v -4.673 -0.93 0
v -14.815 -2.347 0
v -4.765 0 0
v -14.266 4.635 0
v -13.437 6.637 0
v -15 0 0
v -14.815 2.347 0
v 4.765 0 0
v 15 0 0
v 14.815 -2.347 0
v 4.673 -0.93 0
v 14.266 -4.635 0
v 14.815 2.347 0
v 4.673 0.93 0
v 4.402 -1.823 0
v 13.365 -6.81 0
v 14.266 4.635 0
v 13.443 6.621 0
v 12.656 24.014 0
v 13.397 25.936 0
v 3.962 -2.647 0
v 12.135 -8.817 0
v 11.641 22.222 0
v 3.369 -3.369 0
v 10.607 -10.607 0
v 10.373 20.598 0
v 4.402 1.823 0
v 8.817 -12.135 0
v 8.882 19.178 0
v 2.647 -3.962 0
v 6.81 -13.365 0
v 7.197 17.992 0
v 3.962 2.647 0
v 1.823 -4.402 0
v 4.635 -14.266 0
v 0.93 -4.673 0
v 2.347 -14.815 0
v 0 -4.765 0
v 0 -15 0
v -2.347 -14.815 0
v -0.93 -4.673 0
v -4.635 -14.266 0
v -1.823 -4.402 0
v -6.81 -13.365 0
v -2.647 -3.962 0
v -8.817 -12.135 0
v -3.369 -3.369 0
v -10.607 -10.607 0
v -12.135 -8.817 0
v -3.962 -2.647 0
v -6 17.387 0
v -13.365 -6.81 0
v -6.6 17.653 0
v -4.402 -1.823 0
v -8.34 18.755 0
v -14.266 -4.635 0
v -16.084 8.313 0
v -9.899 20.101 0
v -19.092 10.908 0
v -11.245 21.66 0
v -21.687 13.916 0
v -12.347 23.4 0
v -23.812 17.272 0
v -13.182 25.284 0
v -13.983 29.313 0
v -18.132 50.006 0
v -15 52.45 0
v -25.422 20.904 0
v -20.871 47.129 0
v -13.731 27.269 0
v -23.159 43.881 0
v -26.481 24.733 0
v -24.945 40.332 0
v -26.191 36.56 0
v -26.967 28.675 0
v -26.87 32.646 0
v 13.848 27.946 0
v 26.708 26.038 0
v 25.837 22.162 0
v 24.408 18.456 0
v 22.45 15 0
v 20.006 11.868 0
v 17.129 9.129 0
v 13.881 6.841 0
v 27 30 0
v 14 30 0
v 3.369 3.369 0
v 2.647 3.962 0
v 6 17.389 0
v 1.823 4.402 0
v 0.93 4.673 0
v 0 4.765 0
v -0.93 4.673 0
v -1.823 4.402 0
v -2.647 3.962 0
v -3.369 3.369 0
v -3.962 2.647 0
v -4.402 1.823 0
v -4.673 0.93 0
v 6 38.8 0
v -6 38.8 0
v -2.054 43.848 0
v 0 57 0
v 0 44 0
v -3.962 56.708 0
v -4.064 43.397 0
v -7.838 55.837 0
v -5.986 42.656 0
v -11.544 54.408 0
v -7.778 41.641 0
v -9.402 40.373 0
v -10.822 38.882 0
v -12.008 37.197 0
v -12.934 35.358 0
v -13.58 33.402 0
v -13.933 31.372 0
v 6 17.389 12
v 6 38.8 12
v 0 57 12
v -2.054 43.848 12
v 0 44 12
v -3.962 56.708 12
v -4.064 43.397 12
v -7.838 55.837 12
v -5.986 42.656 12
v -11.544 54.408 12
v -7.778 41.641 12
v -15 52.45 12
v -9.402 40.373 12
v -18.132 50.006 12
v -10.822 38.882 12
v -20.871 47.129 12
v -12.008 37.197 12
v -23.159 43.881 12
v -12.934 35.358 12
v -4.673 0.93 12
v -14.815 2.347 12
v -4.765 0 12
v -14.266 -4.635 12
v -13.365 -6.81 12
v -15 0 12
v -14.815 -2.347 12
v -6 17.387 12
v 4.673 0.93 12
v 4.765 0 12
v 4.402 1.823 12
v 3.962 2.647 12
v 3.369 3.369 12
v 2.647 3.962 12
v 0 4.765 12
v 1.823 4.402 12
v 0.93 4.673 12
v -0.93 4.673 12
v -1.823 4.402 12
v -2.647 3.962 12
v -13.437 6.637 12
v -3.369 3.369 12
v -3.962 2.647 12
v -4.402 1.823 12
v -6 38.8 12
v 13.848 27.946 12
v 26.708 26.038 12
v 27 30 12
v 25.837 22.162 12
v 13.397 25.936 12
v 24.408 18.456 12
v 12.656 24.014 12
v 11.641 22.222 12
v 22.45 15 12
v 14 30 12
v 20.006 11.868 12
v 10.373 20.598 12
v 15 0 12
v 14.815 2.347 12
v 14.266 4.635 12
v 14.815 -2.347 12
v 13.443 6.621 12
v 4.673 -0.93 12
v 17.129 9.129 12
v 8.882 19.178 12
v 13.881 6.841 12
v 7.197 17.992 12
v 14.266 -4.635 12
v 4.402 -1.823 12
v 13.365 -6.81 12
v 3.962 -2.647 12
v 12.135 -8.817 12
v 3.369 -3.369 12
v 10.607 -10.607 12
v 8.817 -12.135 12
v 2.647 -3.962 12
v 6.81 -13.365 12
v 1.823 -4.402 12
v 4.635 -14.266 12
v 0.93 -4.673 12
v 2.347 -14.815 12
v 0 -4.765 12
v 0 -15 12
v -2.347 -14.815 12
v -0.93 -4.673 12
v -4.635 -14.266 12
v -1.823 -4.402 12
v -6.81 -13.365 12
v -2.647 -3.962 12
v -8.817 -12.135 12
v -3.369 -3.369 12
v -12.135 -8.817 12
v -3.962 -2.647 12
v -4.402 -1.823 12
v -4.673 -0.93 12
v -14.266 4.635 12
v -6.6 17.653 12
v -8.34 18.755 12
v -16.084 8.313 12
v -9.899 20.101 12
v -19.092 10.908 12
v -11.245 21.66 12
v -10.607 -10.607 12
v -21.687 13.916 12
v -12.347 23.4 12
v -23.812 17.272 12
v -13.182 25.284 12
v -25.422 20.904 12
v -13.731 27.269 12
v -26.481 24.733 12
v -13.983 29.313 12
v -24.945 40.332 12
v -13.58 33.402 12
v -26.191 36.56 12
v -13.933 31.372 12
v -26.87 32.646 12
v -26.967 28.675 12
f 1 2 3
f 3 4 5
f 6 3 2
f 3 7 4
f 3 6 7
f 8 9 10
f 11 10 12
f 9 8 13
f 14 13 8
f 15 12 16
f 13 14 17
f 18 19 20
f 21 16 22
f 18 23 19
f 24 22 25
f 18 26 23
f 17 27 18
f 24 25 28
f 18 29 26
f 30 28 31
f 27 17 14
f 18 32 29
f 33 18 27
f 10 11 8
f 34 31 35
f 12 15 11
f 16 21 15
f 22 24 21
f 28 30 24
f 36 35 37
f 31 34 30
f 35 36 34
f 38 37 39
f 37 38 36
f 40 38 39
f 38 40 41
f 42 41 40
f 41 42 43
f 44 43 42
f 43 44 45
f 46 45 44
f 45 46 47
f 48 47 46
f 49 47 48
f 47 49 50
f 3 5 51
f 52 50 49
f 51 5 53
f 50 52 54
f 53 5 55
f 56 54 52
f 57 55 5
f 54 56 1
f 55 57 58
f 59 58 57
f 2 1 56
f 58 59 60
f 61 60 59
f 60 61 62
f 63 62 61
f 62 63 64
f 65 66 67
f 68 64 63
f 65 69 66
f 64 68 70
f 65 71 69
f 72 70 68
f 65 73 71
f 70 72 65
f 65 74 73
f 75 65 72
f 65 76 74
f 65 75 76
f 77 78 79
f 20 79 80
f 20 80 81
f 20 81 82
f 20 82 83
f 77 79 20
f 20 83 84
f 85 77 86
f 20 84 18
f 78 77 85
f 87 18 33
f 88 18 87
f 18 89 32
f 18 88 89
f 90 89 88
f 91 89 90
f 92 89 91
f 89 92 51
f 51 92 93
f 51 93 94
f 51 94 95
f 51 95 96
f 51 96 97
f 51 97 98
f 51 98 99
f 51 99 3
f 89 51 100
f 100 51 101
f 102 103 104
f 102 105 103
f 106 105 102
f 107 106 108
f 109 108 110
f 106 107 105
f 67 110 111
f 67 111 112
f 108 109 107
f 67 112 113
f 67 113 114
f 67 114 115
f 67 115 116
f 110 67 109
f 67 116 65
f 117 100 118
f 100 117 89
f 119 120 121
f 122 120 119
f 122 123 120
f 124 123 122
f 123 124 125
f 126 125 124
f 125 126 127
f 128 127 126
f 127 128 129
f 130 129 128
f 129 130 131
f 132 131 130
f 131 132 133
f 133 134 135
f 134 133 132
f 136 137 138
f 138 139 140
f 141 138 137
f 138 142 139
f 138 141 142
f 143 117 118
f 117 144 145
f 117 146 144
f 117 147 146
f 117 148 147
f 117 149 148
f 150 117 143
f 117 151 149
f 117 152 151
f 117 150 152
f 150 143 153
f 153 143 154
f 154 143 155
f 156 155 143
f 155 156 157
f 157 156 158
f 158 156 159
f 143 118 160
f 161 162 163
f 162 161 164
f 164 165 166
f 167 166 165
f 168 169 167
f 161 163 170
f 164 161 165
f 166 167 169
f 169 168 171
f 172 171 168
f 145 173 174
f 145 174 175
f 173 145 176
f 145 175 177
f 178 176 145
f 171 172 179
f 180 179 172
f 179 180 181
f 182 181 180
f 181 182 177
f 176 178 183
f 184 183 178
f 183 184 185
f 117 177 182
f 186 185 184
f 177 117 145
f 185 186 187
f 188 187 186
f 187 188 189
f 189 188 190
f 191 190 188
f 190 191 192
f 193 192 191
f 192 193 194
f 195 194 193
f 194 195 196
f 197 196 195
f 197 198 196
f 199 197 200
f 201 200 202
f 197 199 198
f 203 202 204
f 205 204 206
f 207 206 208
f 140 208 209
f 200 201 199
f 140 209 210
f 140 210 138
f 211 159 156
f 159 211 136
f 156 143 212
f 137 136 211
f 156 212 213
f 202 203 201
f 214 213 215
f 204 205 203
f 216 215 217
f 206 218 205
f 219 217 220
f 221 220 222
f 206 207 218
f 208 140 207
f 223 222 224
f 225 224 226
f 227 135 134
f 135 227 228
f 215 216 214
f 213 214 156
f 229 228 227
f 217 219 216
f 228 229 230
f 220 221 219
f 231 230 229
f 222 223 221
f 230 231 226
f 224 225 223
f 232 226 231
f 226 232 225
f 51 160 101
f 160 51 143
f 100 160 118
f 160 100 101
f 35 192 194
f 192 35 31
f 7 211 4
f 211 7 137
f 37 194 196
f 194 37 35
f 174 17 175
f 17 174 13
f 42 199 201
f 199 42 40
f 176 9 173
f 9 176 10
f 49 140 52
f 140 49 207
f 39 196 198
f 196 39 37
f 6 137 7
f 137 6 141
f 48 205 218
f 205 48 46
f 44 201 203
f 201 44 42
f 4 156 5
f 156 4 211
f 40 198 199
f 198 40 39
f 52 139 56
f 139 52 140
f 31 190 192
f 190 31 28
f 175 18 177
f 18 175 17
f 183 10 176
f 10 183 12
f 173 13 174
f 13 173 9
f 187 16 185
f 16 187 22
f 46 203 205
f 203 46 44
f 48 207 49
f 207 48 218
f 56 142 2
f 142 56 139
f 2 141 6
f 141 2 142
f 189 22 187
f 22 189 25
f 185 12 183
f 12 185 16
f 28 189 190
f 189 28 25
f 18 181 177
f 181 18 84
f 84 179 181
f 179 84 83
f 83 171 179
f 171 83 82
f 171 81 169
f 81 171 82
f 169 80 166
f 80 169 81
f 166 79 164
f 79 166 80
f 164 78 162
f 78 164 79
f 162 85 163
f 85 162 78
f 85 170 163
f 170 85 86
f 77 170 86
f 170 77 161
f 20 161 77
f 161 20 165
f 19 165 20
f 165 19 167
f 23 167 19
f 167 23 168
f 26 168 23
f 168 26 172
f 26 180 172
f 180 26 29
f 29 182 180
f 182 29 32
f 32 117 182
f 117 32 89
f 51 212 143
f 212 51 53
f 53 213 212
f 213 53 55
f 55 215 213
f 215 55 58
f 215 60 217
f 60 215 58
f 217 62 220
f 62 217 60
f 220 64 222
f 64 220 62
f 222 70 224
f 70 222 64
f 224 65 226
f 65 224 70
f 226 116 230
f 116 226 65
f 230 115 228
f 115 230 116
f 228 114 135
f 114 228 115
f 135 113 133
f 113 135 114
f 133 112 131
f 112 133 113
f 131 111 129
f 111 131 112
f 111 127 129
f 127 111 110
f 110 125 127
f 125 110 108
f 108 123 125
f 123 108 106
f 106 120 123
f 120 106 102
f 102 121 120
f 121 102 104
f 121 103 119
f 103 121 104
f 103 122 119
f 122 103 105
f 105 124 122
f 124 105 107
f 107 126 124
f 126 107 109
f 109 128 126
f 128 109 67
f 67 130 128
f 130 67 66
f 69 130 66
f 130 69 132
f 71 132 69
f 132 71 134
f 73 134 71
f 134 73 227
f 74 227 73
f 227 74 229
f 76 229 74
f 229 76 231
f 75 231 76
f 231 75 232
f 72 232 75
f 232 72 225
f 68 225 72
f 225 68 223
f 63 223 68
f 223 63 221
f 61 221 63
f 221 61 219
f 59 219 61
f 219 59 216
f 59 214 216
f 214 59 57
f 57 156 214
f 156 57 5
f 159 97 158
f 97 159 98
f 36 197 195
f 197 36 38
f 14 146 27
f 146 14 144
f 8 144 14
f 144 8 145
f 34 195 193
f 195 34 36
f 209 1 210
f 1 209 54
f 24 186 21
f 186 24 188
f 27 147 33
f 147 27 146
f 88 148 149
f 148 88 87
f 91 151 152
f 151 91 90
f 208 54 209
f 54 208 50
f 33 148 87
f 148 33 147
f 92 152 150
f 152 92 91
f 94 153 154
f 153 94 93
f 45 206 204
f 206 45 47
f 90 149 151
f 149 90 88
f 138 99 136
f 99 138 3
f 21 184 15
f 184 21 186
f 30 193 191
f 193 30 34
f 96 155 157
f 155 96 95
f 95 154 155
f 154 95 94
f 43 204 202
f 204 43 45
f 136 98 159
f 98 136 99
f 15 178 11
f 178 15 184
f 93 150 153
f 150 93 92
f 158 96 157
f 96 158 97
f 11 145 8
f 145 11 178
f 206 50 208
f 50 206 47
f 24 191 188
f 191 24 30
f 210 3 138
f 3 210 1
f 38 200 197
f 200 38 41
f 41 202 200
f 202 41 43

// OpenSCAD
$fn = 32;

// ----------------------------------------------------------------------
// Hook: 60 mm shank into a 14 mm curl, 12 mm thick
// ----------------------------------------------------------------------

// --- parameters (mm) ---
shank_len = 60;           // shank length from the boss centre
shank_w = 12;             // shank width
boss_d = 30;              // boss diameter
bore_d = 9.53;            // boss bore
curl_in = 14;             // curl inner radius
curl_out = 27;            // curl outer radius
curl_sweep = 270;         // curl sweep angle
hook_t = 12;              // hook thickness

shank_profile = [[-6, 38.8], [6, 38.8], [6, 13], [-6, 13]];
boss_profile = [[15, 0], [14.815, 2.347], [14.266, 4.635], [13.365, 6.81], [12.135, 8.817], [10.607, 10.607], [8.817, 12.135], [6.81, 13.365], [4.635, 14.266], [2.347, 14.815], [0, 15], [-2.347, 14.815], [-4.635, 14.266], [-6.81, 13.365], [-8.817, 12.135], [-10.607, 10.607], [-12.135, 8.817], [-13.365, 6.81], [-14.266, 4.635], [-14.815, 2.347], [-15, 0], [-14.815, -2.347], [-14.266, -4.635], [-13.365, -6.81], [-12.135, -8.817], [-10.607, -10.607], [-8.817, -12.135], [-6.81, -13.365], [-4.635, -14.266], [-2.347, -14.815], [0, -15], [2.347, -14.815], [4.635, -14.266], [6.81, -13.365], [8.817, -12.135], [10.607, -10.607], [12.135, -8.817], [13.365, -6.81], [14.266, -4.635], [14.815, -2.347]];
curl_profile = [[0, 57], [-3.962, 56.708], [-7.838, 55.837], [-11.544, 54.408], [-15, 52.45], [-18.132, 50.006], [-20.871, 47.129], [-23.159, 43.881], [-24.945, 40.332], [-26.191, 36.56], [-26.87, 32.646], [-26.967, 28.675], [-26.481, 24.733], [-25.422, 20.904], [-23.812, 17.272], [-21.687, 13.916], [-19.092, 10.908], [-16.084, 8.313], [-12.728, 6.188], [-9.096, 4.578], [-5.267, 3.519], [-1.325, 3.033], [2.646, 3.13], [6.56, 3.809], [10.332, 5.055], [13.881, 6.841], [17.129, 9.129], [20.006, 11.868], [22.45, 15], [24.408, 18.456], [25.837, 22.162], [26.708, 26.038], [27, 30], [14, 30], [13.848, 27.946], [13.397, 25.936], [12.656, 24.014], [11.641, 22.222], [10.373, 20.598], [8.882, 19.178], [7.197, 17.992], [5.358, 17.066], [3.402, 16.42], [1.372, 16.067], [-0.687, 16.017], [-2.731, 16.269], [-4.716, 16.818], [-6.6, 17.653], [-8.34, 18.755], [-9.899, 20.101], [-11.245, 21.66], [-12.347, 23.4], [-13.182, 25.284], [-13.731, 27.269], [-13.983, 29.313], [-13.933, 31.372], [-13.58, 33.402], [-12.934, 35.358], [-12.008, 37.197], [-10.822, 38.882], [-9.402, 40.373], [-7.778, 41.641], [-5.986, 42.656], [-4.064, 43.397], [-2.054, 43.848], [0, 44]];

difference() {
  union() {
    /* three overlapping outlines: shank, boss and the smooth curl */
    linear_extrude(height = hook_t) polygon(shank_profile);
    linear_extrude(height = hook_t) polygon(boss_profile);
    linear_extrude(height = hook_t) polygon(curl_profile);
  }
  translate([0, 0, -2.5]) cylinder(h = hook_t + 5, d = bore_d);
}
